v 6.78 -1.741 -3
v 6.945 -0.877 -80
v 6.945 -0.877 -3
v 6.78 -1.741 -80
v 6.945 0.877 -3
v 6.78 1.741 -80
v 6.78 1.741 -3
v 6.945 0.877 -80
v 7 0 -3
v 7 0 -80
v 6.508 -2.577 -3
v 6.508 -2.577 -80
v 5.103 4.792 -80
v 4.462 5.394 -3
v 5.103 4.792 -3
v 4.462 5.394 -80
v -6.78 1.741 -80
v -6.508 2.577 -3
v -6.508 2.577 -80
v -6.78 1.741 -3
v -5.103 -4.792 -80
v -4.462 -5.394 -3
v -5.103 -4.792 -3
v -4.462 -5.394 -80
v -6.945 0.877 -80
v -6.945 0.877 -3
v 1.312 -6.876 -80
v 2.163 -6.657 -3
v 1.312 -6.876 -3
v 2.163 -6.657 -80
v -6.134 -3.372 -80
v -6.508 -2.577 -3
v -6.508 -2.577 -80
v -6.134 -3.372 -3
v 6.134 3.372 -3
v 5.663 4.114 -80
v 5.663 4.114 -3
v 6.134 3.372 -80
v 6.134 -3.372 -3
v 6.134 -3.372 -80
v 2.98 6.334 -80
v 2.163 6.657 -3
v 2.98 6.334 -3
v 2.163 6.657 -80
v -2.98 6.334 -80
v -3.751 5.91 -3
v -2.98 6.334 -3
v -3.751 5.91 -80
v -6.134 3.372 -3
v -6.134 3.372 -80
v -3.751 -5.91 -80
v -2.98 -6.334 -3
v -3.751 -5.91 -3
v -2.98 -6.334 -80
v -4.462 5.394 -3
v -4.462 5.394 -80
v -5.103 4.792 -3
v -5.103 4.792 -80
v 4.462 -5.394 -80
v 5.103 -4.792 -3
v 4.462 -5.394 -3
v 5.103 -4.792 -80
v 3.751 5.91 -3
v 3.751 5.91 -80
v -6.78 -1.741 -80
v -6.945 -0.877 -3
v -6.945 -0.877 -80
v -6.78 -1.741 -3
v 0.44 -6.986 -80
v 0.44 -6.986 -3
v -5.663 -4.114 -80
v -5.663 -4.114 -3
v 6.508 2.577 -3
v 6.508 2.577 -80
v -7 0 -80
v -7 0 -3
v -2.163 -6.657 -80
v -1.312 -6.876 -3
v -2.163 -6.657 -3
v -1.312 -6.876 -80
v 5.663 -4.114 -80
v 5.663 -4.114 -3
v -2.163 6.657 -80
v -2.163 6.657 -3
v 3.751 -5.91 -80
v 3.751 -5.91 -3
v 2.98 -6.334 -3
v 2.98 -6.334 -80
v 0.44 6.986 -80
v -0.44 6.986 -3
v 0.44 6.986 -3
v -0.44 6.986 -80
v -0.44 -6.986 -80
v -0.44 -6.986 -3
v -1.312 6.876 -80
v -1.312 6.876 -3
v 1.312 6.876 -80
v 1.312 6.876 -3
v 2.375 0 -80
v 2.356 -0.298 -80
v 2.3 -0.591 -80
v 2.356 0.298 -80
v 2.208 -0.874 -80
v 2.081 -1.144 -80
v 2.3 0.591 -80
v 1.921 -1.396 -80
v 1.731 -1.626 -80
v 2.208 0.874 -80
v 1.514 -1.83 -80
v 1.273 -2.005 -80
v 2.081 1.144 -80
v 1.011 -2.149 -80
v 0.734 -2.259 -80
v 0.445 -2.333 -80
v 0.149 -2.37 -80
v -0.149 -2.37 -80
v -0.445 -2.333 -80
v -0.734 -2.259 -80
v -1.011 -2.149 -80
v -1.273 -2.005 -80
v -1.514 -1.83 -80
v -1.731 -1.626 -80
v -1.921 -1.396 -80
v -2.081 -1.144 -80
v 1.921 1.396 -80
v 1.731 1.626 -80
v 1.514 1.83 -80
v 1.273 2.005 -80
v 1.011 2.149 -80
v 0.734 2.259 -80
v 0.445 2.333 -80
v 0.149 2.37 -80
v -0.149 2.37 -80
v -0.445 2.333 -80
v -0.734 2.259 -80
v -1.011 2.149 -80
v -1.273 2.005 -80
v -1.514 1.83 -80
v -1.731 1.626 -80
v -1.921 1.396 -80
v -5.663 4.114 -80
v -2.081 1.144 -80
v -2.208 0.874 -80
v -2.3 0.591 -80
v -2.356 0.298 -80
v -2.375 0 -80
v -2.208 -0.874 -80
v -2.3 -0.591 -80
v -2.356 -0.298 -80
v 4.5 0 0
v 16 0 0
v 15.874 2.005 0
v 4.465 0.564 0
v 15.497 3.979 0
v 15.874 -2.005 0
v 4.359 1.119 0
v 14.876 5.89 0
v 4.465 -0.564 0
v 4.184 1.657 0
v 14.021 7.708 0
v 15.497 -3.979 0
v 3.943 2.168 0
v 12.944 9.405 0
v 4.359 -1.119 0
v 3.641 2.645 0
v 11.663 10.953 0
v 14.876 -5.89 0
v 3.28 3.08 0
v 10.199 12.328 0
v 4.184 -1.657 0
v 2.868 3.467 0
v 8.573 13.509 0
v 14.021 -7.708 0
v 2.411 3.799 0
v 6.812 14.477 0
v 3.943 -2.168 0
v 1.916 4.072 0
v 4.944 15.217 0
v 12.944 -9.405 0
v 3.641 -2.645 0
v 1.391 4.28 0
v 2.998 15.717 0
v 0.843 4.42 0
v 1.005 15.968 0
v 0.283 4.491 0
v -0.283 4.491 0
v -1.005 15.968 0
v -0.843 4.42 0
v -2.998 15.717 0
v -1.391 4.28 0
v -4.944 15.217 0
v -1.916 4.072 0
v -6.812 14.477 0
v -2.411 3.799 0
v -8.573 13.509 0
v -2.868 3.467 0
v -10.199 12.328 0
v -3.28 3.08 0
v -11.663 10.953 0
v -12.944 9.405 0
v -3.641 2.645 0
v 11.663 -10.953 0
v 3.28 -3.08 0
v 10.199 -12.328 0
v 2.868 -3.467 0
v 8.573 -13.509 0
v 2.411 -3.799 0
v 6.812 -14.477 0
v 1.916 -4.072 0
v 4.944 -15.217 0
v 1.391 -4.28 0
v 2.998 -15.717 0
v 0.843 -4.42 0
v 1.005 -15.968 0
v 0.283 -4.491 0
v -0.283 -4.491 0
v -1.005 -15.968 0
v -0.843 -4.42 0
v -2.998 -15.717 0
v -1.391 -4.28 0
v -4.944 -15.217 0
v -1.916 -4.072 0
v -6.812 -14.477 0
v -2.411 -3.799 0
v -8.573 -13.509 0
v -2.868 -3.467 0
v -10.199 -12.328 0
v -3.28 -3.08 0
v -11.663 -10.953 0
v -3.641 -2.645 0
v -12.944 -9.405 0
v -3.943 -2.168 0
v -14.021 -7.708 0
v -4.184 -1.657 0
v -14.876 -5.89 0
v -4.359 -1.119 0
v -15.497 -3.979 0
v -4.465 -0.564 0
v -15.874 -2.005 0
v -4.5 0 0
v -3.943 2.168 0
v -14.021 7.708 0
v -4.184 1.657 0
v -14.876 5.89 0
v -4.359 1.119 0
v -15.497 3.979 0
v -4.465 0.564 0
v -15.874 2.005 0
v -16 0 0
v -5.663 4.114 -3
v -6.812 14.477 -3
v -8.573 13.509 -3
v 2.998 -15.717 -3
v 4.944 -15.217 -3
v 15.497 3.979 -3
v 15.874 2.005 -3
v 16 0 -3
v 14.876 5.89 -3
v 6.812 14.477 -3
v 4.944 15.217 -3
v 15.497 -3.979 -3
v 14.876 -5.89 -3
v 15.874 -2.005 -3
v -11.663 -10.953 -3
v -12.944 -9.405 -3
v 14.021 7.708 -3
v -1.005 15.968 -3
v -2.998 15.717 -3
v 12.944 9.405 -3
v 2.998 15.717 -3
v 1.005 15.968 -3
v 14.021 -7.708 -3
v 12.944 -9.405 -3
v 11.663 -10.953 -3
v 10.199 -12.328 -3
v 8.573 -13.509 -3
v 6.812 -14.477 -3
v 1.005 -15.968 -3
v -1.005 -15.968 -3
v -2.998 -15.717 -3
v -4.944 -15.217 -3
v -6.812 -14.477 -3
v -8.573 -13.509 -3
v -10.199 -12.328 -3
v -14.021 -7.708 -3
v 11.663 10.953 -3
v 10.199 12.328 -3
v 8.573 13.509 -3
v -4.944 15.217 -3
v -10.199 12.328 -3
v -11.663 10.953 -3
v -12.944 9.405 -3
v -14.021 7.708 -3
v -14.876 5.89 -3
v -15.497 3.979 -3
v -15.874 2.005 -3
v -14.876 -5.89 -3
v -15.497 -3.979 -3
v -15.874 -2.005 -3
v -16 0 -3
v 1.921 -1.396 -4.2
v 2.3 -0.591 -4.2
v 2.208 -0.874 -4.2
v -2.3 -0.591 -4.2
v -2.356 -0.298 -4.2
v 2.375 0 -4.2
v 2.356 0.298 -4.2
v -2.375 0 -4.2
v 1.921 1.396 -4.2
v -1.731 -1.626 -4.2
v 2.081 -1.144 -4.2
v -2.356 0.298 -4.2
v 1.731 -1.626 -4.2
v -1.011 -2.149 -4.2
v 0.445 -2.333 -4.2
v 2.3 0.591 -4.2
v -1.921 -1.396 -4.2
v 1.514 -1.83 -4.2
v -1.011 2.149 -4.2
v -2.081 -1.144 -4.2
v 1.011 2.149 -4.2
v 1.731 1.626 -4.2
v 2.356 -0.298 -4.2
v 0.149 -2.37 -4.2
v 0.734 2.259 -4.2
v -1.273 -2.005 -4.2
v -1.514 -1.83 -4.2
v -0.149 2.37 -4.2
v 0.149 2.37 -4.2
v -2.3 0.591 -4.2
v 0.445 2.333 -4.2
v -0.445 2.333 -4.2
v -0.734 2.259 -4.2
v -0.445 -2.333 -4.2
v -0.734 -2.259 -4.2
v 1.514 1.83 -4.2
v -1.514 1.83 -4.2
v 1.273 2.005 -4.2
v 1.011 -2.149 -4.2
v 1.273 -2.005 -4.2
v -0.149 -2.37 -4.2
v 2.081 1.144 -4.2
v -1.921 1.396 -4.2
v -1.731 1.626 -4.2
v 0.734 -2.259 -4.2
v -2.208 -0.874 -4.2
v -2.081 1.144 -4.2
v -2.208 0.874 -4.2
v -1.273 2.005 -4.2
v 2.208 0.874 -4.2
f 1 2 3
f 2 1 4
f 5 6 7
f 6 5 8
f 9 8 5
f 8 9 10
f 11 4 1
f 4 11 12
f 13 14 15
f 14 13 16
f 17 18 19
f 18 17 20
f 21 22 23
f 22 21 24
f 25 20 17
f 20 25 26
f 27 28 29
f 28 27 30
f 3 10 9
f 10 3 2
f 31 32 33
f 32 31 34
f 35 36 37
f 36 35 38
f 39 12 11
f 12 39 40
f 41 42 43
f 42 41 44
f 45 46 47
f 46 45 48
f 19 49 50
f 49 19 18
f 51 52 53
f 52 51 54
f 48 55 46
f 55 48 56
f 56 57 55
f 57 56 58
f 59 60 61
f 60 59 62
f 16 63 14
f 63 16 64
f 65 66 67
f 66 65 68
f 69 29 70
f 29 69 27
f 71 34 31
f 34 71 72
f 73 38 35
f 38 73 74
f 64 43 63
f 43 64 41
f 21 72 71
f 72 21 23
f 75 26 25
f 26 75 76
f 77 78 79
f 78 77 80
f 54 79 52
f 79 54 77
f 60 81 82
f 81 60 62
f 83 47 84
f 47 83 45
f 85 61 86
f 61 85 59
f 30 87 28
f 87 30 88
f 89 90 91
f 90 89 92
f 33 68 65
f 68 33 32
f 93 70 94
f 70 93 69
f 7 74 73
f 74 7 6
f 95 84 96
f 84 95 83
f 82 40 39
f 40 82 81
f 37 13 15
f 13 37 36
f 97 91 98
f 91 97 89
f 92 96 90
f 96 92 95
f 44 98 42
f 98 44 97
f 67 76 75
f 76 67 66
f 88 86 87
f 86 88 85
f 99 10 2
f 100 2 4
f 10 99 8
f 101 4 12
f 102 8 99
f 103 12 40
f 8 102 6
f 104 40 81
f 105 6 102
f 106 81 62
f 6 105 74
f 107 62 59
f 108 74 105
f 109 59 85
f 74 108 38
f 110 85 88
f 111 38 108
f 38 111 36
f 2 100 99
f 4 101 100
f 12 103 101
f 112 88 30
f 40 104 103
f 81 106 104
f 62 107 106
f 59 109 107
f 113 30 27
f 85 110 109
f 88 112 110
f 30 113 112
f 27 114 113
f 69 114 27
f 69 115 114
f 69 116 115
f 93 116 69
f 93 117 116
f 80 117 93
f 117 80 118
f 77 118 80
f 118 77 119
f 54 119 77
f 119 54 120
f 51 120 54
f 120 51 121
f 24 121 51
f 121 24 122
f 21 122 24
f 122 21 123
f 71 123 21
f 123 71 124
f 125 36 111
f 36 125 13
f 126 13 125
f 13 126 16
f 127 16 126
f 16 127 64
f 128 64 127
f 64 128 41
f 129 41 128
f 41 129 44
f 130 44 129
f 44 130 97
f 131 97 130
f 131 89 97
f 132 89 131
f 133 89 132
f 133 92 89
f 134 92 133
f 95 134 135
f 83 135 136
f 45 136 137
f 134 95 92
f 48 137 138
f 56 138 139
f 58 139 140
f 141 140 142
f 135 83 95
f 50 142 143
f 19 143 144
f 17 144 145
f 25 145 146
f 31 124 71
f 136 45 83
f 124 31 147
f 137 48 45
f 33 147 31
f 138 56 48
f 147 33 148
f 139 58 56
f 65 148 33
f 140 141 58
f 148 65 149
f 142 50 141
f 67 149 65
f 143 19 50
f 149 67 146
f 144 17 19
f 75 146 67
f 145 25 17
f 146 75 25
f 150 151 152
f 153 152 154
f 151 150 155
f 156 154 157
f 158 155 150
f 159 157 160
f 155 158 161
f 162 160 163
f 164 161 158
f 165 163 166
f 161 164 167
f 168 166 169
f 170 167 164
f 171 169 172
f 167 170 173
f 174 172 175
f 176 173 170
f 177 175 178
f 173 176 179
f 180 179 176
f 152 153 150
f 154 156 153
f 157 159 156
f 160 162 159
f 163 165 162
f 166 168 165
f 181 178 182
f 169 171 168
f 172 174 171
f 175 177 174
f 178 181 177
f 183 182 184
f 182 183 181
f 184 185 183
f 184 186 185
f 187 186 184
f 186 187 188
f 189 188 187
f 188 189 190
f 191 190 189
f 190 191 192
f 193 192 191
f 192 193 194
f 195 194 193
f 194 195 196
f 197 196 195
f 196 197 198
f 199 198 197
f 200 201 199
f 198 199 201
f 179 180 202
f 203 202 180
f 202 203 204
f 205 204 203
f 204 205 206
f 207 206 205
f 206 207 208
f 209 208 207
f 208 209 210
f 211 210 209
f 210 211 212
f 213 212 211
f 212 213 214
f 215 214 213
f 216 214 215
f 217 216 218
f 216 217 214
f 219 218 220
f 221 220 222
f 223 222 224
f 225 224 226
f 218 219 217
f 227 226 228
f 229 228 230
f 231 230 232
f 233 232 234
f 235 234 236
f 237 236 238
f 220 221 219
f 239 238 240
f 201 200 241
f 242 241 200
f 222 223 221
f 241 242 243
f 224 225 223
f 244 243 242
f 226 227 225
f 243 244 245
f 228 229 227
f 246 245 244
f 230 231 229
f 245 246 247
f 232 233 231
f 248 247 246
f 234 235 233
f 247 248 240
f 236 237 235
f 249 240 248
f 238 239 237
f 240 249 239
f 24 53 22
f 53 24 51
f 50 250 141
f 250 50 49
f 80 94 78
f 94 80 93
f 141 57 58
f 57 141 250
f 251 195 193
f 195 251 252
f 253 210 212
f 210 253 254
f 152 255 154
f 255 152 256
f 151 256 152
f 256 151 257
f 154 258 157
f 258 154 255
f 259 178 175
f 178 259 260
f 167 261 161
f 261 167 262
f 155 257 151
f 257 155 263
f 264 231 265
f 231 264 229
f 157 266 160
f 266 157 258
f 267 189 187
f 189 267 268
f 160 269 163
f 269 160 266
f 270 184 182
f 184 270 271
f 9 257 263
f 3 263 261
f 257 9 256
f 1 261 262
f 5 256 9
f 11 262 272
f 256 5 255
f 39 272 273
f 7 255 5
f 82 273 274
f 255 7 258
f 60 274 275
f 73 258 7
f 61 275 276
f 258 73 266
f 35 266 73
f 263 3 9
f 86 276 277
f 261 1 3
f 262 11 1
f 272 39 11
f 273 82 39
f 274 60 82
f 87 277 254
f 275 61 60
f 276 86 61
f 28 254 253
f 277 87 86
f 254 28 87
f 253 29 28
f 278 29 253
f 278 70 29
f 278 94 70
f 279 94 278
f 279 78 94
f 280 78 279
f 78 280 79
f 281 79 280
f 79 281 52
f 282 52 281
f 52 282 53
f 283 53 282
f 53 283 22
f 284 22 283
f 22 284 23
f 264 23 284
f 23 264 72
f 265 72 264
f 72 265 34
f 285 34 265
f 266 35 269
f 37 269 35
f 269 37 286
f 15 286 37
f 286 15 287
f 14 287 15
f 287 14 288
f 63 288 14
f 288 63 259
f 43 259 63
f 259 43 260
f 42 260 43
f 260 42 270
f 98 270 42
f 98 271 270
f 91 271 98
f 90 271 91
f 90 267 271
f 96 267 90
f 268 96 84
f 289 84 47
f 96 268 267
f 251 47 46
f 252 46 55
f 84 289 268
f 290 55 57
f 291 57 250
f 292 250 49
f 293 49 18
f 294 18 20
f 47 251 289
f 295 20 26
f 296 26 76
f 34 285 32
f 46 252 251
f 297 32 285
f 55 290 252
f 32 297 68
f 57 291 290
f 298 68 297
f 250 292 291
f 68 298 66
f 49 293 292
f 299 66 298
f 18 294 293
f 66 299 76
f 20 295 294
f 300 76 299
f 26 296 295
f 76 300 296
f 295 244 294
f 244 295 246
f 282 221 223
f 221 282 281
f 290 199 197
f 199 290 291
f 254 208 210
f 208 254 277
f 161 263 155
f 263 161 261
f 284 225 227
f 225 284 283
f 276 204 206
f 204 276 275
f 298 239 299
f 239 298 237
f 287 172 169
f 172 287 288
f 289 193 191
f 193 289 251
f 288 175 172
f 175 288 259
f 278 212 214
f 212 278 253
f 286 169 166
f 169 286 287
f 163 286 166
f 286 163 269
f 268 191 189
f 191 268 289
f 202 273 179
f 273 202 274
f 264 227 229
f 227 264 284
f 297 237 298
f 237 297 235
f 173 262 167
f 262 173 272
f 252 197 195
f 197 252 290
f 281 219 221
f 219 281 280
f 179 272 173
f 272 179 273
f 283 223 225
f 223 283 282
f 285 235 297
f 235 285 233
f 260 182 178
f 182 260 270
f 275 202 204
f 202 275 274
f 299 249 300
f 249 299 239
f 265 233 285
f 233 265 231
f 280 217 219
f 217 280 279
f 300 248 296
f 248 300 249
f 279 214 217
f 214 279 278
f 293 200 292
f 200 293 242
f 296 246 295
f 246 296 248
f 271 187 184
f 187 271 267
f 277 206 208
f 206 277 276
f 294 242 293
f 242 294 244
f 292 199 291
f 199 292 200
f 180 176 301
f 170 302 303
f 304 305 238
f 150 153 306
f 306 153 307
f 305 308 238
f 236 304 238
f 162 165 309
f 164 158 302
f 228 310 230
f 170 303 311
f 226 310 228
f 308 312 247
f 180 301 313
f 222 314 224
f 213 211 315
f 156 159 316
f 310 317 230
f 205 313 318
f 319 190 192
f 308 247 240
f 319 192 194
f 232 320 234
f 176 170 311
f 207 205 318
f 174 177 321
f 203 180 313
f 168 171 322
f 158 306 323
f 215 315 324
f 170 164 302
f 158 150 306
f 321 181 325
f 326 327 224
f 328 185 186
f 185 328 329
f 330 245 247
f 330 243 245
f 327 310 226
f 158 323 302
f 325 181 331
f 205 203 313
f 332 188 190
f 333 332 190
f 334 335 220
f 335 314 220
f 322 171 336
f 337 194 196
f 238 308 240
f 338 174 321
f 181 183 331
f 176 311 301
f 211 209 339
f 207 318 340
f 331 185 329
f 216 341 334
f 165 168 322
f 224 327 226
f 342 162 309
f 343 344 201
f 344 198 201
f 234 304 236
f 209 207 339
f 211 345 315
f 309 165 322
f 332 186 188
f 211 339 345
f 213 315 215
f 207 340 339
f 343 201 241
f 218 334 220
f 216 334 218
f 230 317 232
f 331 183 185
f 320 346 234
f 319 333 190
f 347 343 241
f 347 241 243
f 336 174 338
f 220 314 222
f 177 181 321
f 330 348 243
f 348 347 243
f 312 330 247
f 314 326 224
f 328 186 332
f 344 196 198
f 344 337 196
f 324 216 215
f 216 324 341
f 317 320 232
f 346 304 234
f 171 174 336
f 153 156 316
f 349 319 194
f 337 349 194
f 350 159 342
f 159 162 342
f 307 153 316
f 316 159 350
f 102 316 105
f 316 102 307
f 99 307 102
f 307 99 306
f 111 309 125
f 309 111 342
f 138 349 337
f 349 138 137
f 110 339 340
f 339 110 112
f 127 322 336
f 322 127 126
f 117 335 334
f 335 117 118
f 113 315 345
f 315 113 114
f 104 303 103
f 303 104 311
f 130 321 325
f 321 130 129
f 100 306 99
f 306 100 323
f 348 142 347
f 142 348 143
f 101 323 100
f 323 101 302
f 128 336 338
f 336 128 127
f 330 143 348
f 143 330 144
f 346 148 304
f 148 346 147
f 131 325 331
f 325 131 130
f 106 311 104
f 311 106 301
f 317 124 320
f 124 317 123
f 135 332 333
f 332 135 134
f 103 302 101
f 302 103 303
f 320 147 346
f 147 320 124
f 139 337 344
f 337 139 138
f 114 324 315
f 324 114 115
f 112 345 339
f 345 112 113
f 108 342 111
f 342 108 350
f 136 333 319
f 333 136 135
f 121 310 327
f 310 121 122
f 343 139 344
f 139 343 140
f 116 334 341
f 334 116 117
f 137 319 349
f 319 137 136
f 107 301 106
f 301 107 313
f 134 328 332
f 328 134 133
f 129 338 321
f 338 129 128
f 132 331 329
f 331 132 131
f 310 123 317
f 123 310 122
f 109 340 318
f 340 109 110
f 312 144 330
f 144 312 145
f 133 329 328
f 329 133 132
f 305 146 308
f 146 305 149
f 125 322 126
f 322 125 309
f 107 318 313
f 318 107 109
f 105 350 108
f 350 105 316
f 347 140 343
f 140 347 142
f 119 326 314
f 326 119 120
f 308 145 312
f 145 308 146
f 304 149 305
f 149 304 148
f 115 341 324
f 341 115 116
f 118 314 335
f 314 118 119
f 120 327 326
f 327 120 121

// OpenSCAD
$fn = 50;


difference() {
	union() {
		translate(v = [0, 0, -80.0000000000]) {
			cylinder(h = 80, r = 7.0000000000);
		}
		translate(v = [0, 0, -3.0000000000]) {
			cylinder(h = 3, r = 16.0000000000);
		}
	}
	union() {
		translate(v = [0, 0, 0]) {
			rotate(a = [0, 0, 0]) {
				difference() {
					union() {
						#translate(v = [0, 0, -80.0000000000]) {
							cylinder(h = 80, r = 2.2500000000);
						}
						#translate(v = [0, 0, -4.2000000000]) {
							cylinder(h = 4.2000000000, r1 = 2.3750000000, r2 = 4.5000000000);
						}
						#translate(v = [0, 0, -80.0000000000]) {
							cylinder(h = 80, r = 2.3750000000);
						}
						#translate(v = [0, 0, -80.0000000000]) {
							cylinder(h = 80, r = 2.2500000000);
						}
					}
					union();
				}
			}
		}
	}
}
